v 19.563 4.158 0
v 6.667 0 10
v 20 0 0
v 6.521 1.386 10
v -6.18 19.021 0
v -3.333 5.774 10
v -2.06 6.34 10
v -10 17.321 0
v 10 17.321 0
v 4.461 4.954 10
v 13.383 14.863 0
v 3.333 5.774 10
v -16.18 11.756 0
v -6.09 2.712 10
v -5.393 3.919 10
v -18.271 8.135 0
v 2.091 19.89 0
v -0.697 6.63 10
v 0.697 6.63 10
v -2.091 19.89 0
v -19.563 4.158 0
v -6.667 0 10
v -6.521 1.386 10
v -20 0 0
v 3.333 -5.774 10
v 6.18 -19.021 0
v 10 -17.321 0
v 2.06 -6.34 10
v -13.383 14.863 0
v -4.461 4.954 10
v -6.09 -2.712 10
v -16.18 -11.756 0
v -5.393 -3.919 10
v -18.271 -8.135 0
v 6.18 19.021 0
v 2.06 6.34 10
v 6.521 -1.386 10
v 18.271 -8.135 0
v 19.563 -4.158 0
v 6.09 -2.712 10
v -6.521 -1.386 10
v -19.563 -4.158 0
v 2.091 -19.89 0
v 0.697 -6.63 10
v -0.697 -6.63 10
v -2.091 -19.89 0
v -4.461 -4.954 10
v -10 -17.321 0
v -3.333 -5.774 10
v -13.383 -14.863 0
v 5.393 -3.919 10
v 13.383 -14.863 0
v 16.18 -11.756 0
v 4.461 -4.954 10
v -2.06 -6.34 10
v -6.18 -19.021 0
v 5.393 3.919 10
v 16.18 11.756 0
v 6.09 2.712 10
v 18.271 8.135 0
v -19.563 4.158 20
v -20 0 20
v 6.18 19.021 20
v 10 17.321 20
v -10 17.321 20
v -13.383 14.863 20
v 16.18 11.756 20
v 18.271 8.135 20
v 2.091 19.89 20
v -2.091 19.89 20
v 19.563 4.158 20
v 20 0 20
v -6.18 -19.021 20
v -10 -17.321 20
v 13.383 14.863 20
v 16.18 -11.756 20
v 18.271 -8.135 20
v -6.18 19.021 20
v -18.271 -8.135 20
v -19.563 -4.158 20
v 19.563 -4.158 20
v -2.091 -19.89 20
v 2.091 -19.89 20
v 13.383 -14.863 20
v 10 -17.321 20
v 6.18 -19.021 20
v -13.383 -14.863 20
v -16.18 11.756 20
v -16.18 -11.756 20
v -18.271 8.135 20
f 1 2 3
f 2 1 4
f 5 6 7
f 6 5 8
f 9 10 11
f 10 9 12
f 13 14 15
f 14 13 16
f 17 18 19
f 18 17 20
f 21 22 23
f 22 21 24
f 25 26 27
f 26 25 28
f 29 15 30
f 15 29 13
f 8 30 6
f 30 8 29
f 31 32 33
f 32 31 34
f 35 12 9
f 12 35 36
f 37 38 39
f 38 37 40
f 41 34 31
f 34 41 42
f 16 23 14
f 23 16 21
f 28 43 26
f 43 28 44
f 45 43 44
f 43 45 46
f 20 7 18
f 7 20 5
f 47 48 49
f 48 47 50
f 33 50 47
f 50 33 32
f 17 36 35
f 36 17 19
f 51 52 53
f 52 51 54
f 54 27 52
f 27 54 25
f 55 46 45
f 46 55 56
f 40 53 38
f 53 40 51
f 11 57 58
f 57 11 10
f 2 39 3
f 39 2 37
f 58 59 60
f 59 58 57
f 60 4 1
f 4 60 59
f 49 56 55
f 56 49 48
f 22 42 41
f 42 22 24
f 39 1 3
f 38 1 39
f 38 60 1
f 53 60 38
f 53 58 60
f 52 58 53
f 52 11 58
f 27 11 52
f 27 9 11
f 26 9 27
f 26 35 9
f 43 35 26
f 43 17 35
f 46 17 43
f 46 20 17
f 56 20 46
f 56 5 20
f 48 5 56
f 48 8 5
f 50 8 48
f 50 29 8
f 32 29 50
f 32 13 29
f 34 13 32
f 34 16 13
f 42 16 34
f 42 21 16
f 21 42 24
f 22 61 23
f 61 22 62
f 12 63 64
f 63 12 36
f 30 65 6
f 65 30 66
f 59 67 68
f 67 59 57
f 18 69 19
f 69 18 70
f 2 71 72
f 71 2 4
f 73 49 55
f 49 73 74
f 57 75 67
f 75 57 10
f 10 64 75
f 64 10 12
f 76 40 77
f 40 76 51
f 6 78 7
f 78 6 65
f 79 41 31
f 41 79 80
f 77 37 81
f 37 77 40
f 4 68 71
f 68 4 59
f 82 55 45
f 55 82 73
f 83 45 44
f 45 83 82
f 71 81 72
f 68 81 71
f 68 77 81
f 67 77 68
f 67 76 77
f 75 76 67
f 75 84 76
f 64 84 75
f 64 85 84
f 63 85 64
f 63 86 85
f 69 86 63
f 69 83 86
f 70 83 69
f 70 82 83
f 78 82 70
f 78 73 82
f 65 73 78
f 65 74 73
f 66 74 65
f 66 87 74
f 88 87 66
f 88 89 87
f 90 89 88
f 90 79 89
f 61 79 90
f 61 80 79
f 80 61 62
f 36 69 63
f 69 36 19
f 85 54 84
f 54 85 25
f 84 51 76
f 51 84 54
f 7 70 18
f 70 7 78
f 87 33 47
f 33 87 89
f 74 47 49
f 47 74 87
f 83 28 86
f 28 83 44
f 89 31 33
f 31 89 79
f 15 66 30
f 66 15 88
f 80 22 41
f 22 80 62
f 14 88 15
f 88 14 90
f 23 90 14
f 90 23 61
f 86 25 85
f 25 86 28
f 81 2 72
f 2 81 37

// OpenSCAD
color("yellow"){
cylinder(h=15, r1=20, r2=0);
translate([0,0,20])
rotate([0,-180,0])
cylinder(h=15, r1=20, r2=0);
}
